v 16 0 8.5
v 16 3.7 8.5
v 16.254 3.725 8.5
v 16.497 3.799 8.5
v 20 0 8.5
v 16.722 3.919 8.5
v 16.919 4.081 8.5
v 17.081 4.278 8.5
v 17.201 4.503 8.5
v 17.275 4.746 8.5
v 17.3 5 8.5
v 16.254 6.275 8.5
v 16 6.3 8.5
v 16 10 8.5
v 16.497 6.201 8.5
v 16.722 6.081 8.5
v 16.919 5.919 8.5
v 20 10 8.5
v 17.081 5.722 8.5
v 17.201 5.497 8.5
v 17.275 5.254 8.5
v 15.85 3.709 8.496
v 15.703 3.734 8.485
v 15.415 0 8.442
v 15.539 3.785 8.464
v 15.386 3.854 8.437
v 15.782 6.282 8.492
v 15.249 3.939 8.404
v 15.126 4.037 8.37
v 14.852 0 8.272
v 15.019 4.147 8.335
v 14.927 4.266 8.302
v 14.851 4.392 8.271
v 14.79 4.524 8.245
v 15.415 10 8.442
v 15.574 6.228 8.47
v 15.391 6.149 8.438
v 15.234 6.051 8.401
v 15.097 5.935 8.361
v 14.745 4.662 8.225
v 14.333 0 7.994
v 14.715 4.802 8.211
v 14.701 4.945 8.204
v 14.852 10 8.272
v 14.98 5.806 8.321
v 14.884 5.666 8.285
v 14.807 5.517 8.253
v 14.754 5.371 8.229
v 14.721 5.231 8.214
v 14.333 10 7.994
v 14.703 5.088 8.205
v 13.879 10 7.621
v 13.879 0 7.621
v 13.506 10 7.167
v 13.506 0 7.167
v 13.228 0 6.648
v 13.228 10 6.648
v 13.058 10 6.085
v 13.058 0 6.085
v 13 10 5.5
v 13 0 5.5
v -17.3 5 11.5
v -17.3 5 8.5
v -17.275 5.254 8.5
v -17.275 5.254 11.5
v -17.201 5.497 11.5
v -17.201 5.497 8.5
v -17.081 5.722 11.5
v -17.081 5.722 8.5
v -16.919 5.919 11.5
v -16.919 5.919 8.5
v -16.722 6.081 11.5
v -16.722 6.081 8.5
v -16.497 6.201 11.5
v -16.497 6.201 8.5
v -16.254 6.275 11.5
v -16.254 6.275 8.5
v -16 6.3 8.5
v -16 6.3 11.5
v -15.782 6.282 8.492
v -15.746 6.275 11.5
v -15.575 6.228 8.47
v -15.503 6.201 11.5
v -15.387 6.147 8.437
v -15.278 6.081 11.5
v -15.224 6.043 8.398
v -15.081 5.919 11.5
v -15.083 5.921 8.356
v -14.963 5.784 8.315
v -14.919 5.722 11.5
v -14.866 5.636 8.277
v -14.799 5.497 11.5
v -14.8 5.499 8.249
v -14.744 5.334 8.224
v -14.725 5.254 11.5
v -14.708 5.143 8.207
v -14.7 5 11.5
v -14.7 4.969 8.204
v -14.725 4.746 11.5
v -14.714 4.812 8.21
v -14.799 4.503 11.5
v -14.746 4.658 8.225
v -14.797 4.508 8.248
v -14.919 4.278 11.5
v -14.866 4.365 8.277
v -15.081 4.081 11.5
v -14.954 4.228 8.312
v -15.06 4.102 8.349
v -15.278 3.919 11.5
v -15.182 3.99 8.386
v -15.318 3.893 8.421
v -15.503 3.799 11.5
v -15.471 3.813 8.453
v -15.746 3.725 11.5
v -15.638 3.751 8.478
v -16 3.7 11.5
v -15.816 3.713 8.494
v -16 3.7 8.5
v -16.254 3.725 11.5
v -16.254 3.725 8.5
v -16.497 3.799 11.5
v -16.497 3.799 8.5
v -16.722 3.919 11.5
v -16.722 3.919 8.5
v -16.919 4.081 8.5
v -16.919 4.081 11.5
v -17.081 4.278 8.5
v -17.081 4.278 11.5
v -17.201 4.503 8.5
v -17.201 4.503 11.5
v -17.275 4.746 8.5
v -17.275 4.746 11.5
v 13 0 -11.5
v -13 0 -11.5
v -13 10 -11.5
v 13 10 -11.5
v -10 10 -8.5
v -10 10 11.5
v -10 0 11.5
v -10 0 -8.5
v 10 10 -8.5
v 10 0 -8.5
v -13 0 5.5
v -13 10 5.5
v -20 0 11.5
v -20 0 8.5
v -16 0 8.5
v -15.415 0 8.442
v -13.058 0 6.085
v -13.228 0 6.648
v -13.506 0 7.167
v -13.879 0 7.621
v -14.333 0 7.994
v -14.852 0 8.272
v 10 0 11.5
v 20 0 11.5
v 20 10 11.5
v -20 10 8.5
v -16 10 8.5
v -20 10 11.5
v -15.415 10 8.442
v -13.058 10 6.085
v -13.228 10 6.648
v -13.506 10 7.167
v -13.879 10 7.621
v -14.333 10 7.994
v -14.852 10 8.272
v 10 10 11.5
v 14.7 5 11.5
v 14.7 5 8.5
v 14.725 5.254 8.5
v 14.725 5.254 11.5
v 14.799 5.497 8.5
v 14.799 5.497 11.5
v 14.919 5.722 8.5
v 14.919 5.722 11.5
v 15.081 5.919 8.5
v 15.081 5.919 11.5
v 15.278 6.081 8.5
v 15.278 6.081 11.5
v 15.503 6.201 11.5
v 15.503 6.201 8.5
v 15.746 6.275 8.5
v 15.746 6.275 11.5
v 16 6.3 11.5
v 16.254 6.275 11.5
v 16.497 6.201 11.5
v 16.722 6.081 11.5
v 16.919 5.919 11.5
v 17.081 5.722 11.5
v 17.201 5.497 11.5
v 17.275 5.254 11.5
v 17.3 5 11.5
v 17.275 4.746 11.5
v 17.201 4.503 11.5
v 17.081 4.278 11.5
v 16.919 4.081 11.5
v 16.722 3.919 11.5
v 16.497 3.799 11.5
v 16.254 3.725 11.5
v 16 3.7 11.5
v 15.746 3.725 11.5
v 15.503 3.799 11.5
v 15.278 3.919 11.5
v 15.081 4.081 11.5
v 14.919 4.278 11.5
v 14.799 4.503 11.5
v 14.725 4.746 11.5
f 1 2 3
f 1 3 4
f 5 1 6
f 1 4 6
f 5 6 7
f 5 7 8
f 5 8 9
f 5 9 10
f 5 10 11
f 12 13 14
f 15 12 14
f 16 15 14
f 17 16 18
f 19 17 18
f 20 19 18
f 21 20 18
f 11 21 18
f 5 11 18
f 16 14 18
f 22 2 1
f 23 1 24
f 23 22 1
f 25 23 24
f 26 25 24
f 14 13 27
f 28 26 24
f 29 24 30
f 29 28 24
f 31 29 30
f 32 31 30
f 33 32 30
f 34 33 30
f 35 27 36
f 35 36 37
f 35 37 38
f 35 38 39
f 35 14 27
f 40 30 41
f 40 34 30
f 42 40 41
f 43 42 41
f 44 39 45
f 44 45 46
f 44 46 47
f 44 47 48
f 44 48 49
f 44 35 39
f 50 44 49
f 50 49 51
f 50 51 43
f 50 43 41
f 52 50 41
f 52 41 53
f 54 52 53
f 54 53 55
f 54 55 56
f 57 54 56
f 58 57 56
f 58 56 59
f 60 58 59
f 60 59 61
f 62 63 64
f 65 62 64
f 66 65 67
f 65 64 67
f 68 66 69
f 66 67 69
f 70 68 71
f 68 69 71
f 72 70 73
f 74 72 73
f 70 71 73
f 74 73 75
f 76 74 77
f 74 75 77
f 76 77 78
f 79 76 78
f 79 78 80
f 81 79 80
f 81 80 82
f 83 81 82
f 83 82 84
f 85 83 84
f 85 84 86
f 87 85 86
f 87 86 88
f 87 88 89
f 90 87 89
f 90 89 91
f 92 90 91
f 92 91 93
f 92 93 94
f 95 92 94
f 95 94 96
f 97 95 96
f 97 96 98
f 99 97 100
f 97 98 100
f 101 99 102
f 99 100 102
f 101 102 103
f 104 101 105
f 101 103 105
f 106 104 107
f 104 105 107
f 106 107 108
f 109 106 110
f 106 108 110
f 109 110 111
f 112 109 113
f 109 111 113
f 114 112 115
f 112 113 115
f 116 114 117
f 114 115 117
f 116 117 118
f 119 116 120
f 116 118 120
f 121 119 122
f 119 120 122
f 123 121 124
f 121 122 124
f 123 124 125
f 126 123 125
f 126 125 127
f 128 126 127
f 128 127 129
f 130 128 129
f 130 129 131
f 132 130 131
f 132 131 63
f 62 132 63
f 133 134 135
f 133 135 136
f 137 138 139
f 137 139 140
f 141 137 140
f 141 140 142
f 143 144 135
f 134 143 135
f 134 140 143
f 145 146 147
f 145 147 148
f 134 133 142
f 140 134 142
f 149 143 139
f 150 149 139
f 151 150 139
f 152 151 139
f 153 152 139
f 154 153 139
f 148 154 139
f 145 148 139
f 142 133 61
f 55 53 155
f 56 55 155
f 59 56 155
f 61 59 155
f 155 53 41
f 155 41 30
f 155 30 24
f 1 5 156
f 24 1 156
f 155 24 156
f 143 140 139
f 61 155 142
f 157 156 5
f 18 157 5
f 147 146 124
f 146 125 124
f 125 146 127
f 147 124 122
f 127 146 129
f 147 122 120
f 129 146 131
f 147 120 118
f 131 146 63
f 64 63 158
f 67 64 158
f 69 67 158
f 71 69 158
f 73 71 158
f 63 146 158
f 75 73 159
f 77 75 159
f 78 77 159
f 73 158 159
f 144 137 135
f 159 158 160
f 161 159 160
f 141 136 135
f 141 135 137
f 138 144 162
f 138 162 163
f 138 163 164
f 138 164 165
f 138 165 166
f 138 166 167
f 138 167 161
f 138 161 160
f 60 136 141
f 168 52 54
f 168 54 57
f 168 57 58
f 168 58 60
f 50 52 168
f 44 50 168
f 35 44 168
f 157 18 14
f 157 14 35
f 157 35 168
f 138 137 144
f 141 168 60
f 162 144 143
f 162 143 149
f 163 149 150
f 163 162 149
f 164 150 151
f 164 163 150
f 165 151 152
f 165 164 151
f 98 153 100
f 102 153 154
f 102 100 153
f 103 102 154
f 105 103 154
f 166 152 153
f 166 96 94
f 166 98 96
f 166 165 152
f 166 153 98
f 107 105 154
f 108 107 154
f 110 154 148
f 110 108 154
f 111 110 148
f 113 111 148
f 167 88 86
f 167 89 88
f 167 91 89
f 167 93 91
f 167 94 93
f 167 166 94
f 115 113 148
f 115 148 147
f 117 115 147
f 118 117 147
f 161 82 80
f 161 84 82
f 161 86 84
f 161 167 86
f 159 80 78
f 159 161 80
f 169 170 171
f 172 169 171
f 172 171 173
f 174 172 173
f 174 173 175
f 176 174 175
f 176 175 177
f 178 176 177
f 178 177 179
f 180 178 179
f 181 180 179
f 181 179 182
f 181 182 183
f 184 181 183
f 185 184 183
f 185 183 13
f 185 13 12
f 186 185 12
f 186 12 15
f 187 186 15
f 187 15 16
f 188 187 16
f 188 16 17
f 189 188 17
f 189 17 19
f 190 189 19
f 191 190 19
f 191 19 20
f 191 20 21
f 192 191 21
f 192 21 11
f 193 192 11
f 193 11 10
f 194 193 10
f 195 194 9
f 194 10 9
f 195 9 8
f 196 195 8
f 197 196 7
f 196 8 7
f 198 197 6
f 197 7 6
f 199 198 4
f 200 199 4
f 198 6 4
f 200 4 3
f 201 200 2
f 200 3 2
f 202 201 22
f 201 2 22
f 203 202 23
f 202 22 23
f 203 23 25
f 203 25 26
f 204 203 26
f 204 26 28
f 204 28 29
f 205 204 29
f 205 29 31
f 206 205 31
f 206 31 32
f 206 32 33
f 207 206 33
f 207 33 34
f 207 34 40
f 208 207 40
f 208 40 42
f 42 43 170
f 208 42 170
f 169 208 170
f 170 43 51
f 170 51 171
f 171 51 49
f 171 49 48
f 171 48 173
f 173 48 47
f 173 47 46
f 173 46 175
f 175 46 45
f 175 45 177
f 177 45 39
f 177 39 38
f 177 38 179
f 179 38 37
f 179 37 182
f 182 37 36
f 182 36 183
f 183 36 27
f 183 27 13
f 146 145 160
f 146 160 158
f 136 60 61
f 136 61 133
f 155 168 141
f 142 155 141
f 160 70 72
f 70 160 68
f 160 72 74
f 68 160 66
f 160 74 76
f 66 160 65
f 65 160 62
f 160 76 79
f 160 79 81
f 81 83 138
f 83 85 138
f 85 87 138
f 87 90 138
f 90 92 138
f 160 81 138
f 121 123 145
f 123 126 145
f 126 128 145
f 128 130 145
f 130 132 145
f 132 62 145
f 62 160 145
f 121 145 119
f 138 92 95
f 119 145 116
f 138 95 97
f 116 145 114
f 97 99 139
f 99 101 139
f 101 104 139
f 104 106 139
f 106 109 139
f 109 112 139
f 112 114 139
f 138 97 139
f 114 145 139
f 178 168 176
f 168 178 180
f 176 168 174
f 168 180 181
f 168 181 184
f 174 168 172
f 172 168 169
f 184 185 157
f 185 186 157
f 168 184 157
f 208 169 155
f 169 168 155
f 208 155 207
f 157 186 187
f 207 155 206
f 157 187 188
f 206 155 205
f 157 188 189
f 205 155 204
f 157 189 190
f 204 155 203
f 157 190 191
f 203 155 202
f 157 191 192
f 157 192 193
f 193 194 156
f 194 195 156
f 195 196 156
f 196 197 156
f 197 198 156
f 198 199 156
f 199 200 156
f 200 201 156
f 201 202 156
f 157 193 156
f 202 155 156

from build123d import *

# Parameters (mm, degrees)
SKETCH_1_W          = 40
SKETCH_1_H          = 23
EXTRUDE_1_DEPTH     = 10
SKETCH_2_W          = 7
SKETCH_2_H          = 20
CUT_EXTRUDE_1_DEPTH = 10
SKETCH_3_W          = 20
SKETCH_3_H          = 20
CUT_EXTRUDE_2_DEPTH = 10
SKETCH_4_R          = 1.3
CUT_EXTRUDE_3_DEPTH = 10
FILLET_1_R          = 3
FILLET_2_R          = 3


with BuildPart() as part:
    # 草图1 → 凸台-拉伸1 (new body)
    with BuildSketch(Plane(origin=(0, 0, 0), x_dir=(1, 0, 0), z_dir=(0, 1, 0))):
        Rectangle(SKETCH_1_W, SKETCH_1_H)
    extrude(amount=EXTRUDE_1_DEPTH)

    # 草图2 → 切除-拉伸1 (cut)
    with BuildSketch(Plane(origin=(0, 10, 0), x_dir=(1, 0, 0), z_dir=(0, 1, 0))):
        with Locations((-16.5, 1.5)):
            Rectangle(SKETCH_2_W, SKETCH_2_H)
        with Locations((16.5, 1.5)):
            Rectangle(SKETCH_2_W, SKETCH_2_H)
    extrude(amount=-CUT_EXTRUDE_1_DEPTH, mode=Mode.SUBTRACT)

    # 草图3 → 切除-拉伸2 (cut)
    with BuildSketch(Plane(origin=(0, 10, 0), x_dir=(1, 0, 0), z_dir=(0, 1, 0))):
        with Locations((0, -1.5)):
            Rectangle(SKETCH_3_W, SKETCH_3_H)
    extrude(amount=-CUT_EXTRUDE_2_DEPTH, mode=Mode.SUBTRACT)

    # 草图4 → 切除-拉伸3 (cut)
    with BuildSketch(Plane(origin=(0, 0, 8.5), x_dir=(-1, 0, 0), z_dir=(0, 0, -1))):
        with Locations((16, 5)):
            Circle(SKETCH_4_R)
        with Locations((-16, 5)):
            Circle(SKETCH_4_R)
    extrude(amount=-CUT_EXTRUDE_3_DEPTH, mode=Mode.SUBTRACT)

    # 圆角1
    # the kernel refuses this fillet: 3 mm, written as the material it adds along each edge
    with BuildSketch(Plane(origin=(13, 10, 8.5), x_dir=(0, 0, -1), z_dir=(0, -1, 0))) as fillet_1_piece_1_section:
        with BuildLine():
            CenterArc((FILLET_1_R, FILLET_1_R), FILLET_1_R, 180, 90)
            Line((0, FILLET_1_R), (0, 0))
            Line((0, 0), (FILLET_1_R, 0))
        make_face()
    fillet_1_piece_1 = extrude(amount=10, mode=Mode.PRIVATE)
    fillet_1_piece_1 = fillet_1_piece_1 - Plane(origin=(16, 5, 7.810677701), x_dir=(-1, 0, 0), z_dir=(0, 0, -1)) * Cylinder(1.3, 32, mode=Mode.PRIVATE)
    add(fillet_1_piece_1)

    # 圆角2
    # the kernel refuses this fillet: 3 mm, written as the material it adds along each edge
    with BuildSketch(Plane(origin=(-13, 10, 8.5), x_dir=(0, 0, -1), z_dir=(0, -1, 0))) as fillet_2_piece_1_section:
        with BuildLine():
            CenterArc((FILLET_2_R, -FILLET_2_R), FILLET_2_R, 90, 90)
            Line((0, -FILLET_2_R), (0, 0))
            Line((0, 0), (FILLET_2_R, 0))
        make_face()
    fillet_2_piece_1 = extrude(amount=10, mode=Mode.PRIVATE)
    fillet_2_piece_1 = fillet_2_piece_1 - Plane(origin=(-16, 5, 7.810678225), x_dir=(-1, 0, 0), z_dir=(0, 0, -1)) * Cylinder(1.3, 32, mode=Mode.PRIVATE)
    add(fillet_2_piece_1)


solid = part.part
